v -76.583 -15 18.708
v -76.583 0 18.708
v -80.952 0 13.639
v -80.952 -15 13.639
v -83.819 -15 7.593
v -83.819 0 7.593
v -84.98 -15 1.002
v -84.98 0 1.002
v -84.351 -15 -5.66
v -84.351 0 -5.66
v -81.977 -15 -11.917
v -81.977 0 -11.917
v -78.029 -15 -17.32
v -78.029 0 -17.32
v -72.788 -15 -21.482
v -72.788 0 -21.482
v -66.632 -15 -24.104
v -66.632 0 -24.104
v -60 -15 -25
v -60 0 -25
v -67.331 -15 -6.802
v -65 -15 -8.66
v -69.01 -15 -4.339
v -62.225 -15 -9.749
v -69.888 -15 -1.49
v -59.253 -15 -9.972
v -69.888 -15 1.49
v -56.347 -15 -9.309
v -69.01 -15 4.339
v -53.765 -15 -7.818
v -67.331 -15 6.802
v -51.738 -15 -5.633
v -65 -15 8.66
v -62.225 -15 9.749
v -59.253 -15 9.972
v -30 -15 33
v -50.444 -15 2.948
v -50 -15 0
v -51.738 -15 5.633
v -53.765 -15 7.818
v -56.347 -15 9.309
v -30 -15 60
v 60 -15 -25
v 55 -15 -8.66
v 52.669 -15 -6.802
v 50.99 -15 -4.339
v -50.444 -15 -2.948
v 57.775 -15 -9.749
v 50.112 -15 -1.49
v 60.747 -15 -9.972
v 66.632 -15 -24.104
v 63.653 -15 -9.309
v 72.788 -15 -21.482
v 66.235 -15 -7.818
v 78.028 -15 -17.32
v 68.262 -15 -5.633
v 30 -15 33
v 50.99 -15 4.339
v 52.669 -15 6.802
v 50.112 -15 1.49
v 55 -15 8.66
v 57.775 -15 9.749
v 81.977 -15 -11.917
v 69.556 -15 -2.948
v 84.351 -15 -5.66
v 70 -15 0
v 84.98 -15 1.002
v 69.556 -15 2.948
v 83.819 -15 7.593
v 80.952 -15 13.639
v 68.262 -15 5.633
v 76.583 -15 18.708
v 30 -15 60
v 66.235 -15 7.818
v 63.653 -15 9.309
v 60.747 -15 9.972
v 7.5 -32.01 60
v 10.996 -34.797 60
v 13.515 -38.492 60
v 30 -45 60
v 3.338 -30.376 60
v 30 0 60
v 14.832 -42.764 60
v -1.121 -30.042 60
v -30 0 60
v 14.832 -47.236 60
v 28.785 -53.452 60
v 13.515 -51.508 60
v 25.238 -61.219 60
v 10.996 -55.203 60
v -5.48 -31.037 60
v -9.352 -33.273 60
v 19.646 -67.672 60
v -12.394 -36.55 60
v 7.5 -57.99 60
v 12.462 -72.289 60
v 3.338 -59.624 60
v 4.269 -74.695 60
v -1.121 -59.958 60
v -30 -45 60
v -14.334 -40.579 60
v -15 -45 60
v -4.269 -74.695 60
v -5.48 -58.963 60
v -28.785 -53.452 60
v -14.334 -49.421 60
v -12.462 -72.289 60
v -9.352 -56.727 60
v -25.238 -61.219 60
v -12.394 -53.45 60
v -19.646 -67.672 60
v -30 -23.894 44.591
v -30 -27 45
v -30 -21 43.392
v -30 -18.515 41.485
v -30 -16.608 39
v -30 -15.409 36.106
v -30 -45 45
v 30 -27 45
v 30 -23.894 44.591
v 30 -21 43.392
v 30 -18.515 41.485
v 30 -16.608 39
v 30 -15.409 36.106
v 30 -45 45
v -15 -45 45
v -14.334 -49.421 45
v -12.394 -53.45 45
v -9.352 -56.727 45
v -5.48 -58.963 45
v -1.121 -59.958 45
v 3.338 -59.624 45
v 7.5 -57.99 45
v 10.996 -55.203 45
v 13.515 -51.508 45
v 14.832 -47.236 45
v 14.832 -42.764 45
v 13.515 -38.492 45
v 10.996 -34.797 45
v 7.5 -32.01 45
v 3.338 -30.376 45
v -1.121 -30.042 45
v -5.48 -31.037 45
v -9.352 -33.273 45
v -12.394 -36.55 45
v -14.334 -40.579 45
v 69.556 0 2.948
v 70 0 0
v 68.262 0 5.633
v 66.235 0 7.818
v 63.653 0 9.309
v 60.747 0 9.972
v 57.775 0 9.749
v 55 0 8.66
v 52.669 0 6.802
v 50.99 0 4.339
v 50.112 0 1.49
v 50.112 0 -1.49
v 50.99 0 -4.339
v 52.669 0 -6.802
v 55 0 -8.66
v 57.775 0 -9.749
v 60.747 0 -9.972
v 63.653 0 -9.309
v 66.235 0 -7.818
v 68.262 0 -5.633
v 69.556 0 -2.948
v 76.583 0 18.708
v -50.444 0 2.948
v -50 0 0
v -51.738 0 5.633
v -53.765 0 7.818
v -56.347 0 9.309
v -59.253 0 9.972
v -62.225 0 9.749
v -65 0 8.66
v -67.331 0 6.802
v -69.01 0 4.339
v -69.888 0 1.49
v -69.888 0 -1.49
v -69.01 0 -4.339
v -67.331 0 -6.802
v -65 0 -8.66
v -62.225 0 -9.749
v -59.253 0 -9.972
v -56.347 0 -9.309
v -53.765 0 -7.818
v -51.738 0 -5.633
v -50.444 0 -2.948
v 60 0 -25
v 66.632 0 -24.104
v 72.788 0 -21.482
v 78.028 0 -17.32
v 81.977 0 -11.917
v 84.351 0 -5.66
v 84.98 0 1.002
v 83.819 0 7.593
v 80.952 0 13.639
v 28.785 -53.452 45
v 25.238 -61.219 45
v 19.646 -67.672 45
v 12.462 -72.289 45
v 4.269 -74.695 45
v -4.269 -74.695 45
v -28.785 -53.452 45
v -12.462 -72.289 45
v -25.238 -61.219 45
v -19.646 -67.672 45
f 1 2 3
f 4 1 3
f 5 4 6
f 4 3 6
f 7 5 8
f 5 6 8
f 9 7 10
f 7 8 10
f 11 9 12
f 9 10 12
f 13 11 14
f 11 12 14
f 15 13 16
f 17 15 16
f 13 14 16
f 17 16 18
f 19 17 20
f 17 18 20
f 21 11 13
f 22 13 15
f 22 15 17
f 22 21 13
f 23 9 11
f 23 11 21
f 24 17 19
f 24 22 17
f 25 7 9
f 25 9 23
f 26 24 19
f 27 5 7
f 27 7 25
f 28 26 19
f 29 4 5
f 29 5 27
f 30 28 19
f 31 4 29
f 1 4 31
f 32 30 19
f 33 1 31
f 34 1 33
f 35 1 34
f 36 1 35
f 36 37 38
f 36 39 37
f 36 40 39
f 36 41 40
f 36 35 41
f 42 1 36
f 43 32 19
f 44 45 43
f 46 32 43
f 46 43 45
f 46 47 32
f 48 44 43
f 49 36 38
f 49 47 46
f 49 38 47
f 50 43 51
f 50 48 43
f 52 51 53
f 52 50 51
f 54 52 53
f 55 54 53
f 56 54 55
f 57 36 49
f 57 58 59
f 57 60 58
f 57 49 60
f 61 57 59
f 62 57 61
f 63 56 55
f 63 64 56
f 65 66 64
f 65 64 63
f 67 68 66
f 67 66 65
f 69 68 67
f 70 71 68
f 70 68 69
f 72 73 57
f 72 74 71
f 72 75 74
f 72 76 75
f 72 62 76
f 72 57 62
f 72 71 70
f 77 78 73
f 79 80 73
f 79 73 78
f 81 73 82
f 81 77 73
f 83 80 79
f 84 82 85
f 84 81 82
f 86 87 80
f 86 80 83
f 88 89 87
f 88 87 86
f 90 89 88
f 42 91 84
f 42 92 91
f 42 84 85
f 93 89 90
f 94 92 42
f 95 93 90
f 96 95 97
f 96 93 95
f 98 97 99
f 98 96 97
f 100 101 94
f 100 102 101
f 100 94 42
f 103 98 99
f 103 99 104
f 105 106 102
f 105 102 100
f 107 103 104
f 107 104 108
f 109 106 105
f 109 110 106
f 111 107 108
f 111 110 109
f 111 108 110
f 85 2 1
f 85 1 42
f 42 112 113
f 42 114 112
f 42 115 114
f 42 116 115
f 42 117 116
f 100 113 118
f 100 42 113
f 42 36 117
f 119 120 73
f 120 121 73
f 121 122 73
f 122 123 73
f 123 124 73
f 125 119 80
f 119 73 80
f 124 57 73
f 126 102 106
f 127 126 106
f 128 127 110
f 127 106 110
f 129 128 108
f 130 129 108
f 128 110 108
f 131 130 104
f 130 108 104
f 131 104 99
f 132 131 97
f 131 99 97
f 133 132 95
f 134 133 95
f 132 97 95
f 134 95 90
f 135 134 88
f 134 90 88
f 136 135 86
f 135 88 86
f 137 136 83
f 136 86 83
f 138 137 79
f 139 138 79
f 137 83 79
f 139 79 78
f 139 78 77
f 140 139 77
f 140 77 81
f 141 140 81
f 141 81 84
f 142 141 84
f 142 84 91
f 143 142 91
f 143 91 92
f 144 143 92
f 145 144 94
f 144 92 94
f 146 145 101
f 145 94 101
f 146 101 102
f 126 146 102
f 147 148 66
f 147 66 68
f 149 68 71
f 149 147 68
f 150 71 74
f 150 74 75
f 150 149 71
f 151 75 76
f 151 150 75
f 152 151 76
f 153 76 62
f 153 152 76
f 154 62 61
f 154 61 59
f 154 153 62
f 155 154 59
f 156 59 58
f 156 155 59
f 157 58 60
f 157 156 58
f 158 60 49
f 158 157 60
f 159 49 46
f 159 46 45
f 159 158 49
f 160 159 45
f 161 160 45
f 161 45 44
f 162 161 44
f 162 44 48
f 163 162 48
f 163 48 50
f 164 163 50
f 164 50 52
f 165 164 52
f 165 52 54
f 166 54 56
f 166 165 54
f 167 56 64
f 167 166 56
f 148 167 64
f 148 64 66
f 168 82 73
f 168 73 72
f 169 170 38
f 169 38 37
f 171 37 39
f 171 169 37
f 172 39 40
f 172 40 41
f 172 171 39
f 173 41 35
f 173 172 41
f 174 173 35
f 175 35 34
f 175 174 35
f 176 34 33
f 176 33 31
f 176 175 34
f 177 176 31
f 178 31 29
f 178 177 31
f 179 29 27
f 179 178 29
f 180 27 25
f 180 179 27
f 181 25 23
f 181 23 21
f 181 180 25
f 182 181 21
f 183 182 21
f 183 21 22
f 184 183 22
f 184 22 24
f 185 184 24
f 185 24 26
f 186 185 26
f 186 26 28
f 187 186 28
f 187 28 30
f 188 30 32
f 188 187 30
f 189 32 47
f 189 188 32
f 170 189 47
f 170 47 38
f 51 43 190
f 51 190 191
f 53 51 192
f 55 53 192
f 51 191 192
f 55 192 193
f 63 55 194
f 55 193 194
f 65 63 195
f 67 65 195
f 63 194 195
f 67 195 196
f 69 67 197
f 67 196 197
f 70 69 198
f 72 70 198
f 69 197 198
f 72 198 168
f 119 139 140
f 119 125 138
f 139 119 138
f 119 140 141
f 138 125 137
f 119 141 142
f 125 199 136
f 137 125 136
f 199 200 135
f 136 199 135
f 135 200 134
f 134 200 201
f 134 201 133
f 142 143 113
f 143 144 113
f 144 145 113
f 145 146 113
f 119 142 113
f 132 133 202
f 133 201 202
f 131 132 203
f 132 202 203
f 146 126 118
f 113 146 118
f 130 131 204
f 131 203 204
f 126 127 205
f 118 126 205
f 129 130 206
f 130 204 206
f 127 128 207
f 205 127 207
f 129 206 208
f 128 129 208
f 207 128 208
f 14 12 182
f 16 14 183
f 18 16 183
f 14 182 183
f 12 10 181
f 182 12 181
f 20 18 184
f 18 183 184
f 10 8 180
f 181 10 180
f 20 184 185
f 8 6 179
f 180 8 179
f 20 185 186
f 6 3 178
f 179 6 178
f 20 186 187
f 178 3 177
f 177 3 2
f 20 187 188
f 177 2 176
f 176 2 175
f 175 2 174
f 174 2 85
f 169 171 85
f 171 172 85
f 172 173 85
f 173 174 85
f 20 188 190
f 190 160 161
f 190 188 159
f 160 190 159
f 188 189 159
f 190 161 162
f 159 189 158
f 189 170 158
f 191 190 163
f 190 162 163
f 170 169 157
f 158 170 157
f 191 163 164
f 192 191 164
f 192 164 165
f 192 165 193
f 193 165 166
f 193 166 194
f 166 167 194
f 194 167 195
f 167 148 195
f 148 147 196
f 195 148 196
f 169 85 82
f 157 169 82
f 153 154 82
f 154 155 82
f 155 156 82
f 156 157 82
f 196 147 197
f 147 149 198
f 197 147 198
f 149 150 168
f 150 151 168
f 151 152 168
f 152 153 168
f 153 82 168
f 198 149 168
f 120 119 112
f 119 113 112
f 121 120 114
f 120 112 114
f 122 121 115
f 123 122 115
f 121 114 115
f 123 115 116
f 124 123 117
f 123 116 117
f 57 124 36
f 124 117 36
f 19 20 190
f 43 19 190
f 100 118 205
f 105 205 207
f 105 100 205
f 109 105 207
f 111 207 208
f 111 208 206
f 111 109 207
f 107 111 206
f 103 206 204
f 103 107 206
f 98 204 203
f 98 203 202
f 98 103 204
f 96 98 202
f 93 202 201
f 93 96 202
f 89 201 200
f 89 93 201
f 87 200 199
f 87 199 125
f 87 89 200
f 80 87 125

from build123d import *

# Parameters (mm, degrees)
SKETCH_R     = 10
PAD_DEPTH    = 15
SKETCH001_R  = 15
PAD001_DEPTH = 15
FILLET_R     = 12


with BuildPart() as part:
    # Sketch → Pad (new body)
    with BuildSketch(Plane.XZ):
        with BuildLine():
            ThreePointArc((-76.583116, 18.708294), (-83.37421, -8.868276), (-60, -25))
            Line((-60, -25), (60, -25))
            ThreePointArc((60, -25), (83.374198, -8.868308), (76.583166, 18.70825))
            Line((30, 60), (76.583166, 18.70825))
            Line((-30, 60), (30, 60))
            Line((-76.583116, 18.708294), (-30, 60))
        make_face()
        with Locations((-60, 0)):
            Circle(SKETCH_R, mode=Mode.SUBTRACT)
        with Locations((60, 0)):
            Circle(SKETCH_R, mode=Mode.SUBTRACT)
    extrude(amount=PAD_DEPTH)

    # Sketch001 → Pad001 (new body)
    with BuildSketch(Plane(origin=(0, 0, 60), x_dir=(-1, 0, 0), z_dir=(0, 0, 1))):
        with BuildLine():
            ThreePointArc((30, 44.999961), (2e-05, 75), (-30, 45.000001))
            Line((-30, 0), (-30, 45.000001))
            Line((-30, 0), (30, 0))
            Line((30, 0), (30, 44.999961))
        make_face()
        with Locations((0, 45)):
            Circle(SKETCH001_R, mode=Mode.SUBTRACT)
    extrude(amount=-PAD001_DEPTH)

    # Fillet
    fillet_edges = [part.edges().sort_by_distance(p)[0] for p in [
        (0, -15, 45),
    ]]
    fillet(fillet_edges, radius=FILLET_R)


solid = part.part
